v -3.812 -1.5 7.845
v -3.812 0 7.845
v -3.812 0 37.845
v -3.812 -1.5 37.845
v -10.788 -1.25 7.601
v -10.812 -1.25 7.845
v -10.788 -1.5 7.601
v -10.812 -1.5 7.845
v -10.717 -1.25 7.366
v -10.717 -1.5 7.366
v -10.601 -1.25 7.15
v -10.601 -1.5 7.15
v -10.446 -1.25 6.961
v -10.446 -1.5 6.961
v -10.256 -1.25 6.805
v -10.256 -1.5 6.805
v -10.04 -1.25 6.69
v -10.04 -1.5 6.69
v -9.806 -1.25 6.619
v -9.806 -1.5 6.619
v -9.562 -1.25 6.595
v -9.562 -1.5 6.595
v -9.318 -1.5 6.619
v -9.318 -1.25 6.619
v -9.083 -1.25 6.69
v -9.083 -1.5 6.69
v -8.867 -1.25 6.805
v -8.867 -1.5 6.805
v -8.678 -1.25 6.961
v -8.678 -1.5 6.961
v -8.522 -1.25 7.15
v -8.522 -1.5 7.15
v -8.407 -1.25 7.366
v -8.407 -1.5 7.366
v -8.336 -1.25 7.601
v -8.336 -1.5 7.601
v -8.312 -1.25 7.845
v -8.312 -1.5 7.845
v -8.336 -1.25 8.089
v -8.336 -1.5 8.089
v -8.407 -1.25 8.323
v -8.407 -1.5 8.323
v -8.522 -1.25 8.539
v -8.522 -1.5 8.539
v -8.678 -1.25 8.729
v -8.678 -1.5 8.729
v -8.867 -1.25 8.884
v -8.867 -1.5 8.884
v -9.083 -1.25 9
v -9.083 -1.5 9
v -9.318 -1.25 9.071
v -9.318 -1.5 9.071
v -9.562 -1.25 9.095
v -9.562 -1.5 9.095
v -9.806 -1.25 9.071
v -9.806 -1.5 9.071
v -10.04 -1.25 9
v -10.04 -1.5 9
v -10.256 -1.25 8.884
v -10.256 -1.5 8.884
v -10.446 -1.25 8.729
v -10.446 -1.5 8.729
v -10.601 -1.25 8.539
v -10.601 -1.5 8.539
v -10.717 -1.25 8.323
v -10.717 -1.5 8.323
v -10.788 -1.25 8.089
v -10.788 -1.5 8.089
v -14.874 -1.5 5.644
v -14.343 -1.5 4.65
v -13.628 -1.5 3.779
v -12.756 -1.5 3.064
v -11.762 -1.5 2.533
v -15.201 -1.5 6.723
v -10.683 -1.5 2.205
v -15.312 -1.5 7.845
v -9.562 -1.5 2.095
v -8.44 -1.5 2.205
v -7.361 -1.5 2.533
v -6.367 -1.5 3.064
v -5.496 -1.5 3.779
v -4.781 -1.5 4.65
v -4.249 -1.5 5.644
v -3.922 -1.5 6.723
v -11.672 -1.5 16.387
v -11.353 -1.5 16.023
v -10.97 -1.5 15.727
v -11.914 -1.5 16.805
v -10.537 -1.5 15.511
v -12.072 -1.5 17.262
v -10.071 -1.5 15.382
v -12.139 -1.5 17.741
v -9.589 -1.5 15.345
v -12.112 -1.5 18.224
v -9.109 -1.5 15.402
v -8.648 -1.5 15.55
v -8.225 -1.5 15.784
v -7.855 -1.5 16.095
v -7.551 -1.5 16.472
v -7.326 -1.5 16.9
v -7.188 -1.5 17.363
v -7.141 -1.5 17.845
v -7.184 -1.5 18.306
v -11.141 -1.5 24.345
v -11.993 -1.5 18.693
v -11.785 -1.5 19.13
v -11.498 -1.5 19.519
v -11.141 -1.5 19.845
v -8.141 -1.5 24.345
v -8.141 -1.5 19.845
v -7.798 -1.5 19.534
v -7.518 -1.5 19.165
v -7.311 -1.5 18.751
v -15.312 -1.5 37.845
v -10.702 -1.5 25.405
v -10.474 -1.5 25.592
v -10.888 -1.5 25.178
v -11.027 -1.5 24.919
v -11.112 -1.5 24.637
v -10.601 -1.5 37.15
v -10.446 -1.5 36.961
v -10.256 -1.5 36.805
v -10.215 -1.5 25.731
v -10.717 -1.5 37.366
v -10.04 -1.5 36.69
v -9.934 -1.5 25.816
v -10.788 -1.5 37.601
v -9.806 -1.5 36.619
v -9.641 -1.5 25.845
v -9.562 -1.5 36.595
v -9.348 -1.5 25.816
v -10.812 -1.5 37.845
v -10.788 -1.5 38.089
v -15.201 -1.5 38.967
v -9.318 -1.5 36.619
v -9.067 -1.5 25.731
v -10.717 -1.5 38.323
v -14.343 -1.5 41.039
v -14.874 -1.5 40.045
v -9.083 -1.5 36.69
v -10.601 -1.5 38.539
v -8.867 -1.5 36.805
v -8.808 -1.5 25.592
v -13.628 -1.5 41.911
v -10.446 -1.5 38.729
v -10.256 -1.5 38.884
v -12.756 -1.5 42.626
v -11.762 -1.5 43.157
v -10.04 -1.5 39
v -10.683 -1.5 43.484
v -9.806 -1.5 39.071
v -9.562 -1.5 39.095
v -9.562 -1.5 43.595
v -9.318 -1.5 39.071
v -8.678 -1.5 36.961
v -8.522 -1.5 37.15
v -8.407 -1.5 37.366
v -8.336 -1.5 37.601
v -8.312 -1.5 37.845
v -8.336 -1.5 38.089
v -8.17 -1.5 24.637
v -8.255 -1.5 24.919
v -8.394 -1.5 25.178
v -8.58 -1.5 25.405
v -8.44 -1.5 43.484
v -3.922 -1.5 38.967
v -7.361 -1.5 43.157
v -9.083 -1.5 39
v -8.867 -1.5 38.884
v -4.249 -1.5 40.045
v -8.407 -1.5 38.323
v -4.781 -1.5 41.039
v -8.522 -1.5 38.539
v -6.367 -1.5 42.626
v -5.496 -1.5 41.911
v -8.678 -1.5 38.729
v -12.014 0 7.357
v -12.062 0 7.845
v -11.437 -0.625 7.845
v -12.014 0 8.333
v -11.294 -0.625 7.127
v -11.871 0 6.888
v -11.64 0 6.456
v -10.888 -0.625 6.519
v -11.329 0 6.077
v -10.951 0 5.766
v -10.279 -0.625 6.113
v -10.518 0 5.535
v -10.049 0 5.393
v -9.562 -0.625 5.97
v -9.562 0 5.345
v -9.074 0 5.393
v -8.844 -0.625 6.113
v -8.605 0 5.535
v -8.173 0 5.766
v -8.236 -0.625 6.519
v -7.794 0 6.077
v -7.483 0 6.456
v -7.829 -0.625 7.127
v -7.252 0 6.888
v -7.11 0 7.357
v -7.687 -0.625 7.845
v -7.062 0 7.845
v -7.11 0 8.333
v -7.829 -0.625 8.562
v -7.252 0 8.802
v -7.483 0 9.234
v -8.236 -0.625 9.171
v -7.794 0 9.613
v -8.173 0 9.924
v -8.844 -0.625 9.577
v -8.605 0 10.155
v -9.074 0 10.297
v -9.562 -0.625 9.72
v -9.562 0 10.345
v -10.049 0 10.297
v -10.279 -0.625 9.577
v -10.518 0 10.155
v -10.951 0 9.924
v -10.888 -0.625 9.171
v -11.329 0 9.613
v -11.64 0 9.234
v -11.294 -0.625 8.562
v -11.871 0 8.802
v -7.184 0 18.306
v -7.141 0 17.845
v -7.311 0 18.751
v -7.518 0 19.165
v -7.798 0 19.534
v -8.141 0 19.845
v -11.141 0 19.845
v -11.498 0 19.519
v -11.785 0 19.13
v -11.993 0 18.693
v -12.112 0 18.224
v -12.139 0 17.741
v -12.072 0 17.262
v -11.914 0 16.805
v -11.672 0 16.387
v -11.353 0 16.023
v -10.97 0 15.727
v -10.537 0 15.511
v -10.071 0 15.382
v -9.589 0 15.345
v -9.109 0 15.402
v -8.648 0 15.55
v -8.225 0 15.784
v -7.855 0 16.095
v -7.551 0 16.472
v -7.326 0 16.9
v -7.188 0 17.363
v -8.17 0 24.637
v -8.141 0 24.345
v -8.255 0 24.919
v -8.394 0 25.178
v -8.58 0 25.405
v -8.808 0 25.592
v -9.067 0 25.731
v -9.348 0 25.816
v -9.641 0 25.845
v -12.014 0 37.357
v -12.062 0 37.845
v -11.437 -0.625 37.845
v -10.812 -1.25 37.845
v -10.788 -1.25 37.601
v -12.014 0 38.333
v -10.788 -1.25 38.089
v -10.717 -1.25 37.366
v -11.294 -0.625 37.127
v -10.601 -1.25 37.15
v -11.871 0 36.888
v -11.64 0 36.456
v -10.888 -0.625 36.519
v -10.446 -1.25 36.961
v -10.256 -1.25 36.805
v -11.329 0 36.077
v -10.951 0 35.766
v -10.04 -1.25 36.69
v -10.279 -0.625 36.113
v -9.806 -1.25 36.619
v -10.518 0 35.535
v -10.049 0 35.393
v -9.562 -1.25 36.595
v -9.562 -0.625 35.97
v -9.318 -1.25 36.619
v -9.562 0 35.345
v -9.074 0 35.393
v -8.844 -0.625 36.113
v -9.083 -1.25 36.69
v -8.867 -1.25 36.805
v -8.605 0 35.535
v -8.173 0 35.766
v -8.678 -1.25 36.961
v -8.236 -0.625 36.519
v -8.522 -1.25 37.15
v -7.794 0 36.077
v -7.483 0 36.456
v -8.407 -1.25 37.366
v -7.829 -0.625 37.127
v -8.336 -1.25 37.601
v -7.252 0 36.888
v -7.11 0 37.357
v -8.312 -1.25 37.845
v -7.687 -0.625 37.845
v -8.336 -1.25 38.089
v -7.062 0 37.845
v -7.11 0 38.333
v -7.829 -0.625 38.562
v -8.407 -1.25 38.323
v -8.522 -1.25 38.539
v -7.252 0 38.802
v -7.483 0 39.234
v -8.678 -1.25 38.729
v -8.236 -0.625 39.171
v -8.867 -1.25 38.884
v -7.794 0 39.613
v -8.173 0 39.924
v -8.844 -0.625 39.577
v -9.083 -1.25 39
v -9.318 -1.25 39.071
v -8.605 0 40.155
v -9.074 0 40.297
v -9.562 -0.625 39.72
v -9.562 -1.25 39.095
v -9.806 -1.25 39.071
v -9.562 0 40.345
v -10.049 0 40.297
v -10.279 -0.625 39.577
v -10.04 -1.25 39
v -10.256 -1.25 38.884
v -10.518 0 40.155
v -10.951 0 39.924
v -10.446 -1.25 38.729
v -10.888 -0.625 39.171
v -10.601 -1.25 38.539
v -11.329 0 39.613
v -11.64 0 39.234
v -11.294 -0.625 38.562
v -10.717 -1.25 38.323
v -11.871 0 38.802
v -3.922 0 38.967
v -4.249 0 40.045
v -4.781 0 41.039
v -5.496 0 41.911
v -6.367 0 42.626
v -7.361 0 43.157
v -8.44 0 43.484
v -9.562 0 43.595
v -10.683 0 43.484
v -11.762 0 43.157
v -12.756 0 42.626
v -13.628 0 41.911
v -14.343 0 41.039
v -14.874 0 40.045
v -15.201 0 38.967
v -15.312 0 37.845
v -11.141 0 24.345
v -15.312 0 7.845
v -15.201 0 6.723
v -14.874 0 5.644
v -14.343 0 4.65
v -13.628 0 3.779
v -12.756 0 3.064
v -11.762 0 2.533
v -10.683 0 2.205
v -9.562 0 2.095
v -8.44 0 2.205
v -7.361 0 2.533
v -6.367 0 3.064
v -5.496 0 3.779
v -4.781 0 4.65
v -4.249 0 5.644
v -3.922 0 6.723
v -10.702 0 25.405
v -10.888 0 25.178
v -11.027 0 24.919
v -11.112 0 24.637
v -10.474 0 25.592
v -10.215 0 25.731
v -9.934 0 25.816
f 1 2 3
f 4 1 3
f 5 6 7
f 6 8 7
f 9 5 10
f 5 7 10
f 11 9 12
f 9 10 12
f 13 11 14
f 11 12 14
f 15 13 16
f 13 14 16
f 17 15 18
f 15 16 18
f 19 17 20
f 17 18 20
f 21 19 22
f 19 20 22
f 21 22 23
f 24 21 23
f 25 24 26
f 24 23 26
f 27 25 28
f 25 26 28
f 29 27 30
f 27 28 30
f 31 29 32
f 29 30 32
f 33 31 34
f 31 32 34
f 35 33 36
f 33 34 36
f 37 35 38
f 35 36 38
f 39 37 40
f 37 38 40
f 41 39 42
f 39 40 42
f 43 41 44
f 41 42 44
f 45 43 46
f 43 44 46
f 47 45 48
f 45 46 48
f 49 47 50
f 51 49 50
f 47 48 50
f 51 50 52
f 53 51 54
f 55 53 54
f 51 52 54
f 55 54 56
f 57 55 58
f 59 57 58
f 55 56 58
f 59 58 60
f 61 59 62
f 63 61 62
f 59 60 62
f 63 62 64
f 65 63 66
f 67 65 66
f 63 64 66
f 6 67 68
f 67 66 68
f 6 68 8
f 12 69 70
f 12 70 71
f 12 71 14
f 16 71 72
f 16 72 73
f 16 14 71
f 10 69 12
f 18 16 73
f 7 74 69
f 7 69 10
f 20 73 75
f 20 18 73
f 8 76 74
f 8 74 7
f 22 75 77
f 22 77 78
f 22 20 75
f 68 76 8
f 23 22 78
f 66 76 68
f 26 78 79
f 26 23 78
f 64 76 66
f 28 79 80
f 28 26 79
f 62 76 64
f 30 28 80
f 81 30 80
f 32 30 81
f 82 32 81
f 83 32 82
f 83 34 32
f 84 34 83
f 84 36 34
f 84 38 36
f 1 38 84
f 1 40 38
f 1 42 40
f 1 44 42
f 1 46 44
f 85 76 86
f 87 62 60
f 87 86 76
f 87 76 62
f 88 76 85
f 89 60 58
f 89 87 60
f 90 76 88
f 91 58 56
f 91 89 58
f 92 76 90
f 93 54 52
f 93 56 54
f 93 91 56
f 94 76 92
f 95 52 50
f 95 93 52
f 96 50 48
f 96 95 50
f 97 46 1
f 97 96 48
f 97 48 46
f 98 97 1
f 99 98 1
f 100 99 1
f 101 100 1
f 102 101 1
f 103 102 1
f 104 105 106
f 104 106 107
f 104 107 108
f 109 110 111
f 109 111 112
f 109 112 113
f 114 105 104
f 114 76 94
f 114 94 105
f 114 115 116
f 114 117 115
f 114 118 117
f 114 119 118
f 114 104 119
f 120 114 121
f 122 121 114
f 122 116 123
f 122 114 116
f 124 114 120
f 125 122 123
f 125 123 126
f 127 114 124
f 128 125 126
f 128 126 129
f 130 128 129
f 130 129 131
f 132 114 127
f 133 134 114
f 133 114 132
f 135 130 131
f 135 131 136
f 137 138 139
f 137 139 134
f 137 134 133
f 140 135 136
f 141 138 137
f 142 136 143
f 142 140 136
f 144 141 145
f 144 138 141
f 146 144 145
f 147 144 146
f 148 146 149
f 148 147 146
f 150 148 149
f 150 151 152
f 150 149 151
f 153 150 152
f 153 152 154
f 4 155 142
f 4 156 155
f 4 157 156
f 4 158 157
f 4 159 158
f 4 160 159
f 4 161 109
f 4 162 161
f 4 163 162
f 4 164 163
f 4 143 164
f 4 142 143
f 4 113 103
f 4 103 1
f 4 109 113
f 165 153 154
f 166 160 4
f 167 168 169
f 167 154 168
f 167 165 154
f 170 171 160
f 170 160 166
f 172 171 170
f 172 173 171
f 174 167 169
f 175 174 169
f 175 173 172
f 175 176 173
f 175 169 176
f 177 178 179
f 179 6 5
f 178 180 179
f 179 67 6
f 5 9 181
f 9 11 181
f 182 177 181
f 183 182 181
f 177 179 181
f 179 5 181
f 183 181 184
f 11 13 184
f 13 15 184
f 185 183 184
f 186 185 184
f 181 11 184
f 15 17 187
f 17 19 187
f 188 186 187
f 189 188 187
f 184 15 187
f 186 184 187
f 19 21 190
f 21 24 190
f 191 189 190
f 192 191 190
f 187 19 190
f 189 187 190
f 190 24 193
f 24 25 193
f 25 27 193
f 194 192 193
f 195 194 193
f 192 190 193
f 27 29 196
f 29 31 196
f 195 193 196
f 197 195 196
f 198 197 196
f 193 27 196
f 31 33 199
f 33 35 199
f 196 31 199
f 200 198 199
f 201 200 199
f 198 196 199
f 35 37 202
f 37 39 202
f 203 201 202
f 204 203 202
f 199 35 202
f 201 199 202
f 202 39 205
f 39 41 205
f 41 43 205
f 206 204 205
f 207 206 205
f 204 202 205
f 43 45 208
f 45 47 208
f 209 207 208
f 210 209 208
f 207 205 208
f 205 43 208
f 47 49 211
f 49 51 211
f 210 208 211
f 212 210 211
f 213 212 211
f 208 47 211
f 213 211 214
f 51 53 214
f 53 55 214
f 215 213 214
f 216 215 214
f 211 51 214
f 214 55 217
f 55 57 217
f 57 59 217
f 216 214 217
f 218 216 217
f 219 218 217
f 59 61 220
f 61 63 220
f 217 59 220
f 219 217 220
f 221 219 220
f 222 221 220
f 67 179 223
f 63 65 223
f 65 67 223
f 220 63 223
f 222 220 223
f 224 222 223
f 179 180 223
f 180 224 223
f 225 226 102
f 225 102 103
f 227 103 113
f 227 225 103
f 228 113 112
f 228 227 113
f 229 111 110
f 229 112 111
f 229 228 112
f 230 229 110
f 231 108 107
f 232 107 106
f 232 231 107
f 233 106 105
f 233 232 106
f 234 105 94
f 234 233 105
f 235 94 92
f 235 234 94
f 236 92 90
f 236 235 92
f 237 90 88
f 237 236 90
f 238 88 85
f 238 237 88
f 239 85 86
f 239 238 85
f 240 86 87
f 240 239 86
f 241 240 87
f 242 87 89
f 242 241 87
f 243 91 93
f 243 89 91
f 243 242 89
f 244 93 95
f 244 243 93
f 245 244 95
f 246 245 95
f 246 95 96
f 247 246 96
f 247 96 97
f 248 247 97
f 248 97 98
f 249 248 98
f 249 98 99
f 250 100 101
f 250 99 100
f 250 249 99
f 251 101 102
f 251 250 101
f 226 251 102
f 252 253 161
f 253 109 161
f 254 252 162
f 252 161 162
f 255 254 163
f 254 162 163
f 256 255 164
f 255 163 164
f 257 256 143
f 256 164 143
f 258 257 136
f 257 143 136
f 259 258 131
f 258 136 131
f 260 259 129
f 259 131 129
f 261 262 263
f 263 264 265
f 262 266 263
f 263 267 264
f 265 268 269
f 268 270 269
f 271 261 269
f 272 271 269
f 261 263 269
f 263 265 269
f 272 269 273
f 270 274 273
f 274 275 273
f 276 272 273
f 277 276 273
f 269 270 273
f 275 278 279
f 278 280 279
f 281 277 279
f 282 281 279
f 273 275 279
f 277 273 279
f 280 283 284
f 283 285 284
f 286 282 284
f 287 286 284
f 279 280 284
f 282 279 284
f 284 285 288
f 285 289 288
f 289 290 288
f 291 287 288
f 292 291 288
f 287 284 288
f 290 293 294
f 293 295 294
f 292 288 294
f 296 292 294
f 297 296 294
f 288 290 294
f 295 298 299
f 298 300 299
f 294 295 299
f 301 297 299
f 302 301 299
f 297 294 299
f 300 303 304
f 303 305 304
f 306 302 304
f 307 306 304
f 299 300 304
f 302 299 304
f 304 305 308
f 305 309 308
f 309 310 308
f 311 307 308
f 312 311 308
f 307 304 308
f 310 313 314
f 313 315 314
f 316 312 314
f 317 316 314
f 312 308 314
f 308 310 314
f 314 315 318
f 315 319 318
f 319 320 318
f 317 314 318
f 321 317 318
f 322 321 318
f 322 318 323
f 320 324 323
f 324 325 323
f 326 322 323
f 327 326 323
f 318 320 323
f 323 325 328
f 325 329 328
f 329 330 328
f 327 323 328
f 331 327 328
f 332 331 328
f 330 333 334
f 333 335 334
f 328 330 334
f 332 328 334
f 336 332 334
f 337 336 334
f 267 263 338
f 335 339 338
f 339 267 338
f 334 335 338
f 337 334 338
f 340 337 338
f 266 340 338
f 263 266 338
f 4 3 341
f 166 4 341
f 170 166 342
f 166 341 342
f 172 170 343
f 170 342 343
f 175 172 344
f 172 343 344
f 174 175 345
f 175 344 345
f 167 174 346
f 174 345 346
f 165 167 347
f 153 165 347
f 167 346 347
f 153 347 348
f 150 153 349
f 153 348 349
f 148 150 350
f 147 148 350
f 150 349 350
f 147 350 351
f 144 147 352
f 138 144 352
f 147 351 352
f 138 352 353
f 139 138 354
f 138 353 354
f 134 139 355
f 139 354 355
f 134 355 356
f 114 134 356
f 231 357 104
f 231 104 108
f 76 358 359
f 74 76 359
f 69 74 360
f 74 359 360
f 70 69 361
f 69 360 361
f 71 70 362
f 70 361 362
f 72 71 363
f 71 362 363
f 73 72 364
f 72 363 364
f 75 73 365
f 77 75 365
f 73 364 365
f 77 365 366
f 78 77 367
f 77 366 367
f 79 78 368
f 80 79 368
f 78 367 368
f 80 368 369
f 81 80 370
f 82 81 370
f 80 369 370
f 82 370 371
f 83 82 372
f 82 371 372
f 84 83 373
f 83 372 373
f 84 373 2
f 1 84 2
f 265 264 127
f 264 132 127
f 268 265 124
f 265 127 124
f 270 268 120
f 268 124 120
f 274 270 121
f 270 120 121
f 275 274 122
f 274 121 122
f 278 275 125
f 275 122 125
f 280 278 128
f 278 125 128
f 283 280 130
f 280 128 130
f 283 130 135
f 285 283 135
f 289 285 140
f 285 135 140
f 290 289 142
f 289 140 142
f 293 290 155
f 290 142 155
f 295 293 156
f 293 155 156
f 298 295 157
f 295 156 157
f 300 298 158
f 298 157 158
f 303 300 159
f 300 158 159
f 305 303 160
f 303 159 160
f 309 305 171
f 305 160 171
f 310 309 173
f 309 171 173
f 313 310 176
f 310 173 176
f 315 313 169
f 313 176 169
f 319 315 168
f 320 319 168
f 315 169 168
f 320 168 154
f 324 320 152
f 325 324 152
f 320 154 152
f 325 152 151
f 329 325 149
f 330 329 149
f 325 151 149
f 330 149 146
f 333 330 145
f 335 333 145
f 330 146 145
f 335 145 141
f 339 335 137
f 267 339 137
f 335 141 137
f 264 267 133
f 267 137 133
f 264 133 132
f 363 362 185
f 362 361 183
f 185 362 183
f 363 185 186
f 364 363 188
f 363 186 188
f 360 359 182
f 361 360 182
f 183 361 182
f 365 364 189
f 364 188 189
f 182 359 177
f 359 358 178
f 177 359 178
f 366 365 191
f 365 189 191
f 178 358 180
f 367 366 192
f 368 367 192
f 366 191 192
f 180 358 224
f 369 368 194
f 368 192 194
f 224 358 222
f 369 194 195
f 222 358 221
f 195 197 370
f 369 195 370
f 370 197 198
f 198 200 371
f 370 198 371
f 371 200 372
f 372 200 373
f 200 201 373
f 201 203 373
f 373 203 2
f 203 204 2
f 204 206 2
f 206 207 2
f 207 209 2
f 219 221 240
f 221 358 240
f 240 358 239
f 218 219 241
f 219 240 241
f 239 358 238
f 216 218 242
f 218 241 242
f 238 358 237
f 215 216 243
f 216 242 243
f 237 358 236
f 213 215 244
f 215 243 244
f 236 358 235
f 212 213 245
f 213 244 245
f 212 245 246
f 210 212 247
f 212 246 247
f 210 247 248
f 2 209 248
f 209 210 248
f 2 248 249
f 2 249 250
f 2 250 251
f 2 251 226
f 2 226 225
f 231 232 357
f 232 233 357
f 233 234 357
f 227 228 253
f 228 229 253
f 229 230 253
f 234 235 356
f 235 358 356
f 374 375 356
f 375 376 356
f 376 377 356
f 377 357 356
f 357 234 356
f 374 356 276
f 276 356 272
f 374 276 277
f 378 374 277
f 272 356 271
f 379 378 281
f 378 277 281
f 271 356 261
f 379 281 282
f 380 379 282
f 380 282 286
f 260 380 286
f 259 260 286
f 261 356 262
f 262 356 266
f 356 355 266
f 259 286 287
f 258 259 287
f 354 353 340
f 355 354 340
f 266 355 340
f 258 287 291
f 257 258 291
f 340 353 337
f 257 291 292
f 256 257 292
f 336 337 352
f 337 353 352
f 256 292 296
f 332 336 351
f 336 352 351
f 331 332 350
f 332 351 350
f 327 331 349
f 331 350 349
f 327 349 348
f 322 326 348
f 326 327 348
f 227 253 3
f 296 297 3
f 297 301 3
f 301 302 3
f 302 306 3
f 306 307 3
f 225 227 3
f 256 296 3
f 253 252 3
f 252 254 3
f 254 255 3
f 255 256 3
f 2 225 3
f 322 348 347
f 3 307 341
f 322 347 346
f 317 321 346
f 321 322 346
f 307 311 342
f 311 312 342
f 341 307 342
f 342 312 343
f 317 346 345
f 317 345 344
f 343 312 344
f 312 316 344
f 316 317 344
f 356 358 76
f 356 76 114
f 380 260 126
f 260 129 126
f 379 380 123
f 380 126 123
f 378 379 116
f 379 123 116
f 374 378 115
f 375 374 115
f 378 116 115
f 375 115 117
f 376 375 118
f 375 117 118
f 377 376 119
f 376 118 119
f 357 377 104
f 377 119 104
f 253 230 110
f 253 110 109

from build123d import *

# Parameters (mm, degrees)
F0_W           = 11.5
F0_H           = 30
F1_DEPTH       = 1.5
F2_D           = 2.5
F2_CSINK_D     = 5
F2_CSINK_ANGLE = 90
F4_DEPTH       = 25
F5_R           = 1.49999


# Not quite as in the source:
# - a fillet or chamfer is up to 0.001 mm smaller than in the source, because OpenCascade refuses the exact size


with BuildPart() as f1:
    # F0 (on Front) → F1 (new body)
    with BuildSketch(Plane.XZ):
        with BuildLine():
            ThreePointArc((-3.8116748205, 37.8448306397), (-9.5616748205, 43.5948306397), (-15.3116748205, 37.8448306397))
            Line((-15.3116748205, 37.8448306397), (-3.8116748205, 37.8448306397))
        make_face()
        with Locations((-9.5616748205, 22.8448306397)):
            Rectangle(F0_W, F0_H)
        with BuildLine():
            Line((-3.8116748205, 7.8448306397), (-15.3116748205, 7.8448306397))
            ThreePointArc((-15.3116748205, 7.8448306397), (-9.5616748205, 2.0948306397), (-3.8116748205, 7.8448306397))
        make_face()
    extrude(amount=F1_DEPTH)

    # F2 (through all)
    with Locations(Plane(origin=(0, 0, 0), x_dir=(1, 0, 0), z_dir=(0, 1, 0))):
        with Locations((-9.5616748205, -37.8448306397), (-9.5616748205, -7.8448306397)):
            CounterSinkHole(F2_D / 2, F2_CSINK_D / 2, counter_sink_angle=F2_CSINK_ANGLE)

    # F3 (on face) → F4 (cut)
    with BuildSketch(Plane.XZ):
        with BuildLine():
            Line((-8.1408721001, 19.8448306397), (-8.1408721001, 25.8448306397))
            Line((-8.1408721001, 25.8448306397), (-11.1408721001, 25.8448306397))
            Line((-11.1408721001, 25.8448306397), (-11.1408721001, 19.8448306397))
            ThreePointArc((-11.1408721001, 19.8448306397), (-9.6408721001, 20.3448306397), (-8.1408721001, 19.8448306397))
        make_face()
        with BuildLine():
            ThreePointArc((-7.1408721001, 17.8448306397), (-7.4048041226, 18.9628646284), (-8.1408721001, 19.8448306397))
            Line((-8.1408721001, 19.8448306397), (-8.1408721001, 17.8448306397))
            Line((-8.1408721001, 17.8448306397), (-11.1408721001, 17.8448306397))
            Line((-11.1408721001, 17.8448306397), (-11.1408721001, 19.8448306397))
            ThreePointArc((-11.1408721001, 19.8448306397), (-10.7589060888, 15.6087626622), (-7.1408721001, 17.8448306397))
        make_face()
        with BuildLine():
            Line((-8.1408721001, 17.8448306397), (-8.1408721001, 19.8448306397))
            ThreePointArc((-8.1408721001, 19.8448306397), (-9.6408721001, 20.3448306397), (-11.1408721001, 19.8448306397))
            Line((-11.1408721001, 19.8448306397), (-11.1408721001, 17.8448306397))
            Line((-11.1408721001, 17.8448306397), (-8.1408721001, 17.8448306397))
        make_face()
    extrude(amount=F4_DEPTH, mode=Mode.SUBTRACT)

    # F5 (radius 1.5 in the source; OpenCascade refuses exactly that, so slightly less here)
    f5_edges = [f1.edges().sort_by_distance(p)[0] for p in [
        (-8.140872, -0.75, 25.844831),
        (-11.140872, -0.75, 25.844831),
    ]]
    fillet(f5_edges, radius=F5_R)


solid = f1.part
